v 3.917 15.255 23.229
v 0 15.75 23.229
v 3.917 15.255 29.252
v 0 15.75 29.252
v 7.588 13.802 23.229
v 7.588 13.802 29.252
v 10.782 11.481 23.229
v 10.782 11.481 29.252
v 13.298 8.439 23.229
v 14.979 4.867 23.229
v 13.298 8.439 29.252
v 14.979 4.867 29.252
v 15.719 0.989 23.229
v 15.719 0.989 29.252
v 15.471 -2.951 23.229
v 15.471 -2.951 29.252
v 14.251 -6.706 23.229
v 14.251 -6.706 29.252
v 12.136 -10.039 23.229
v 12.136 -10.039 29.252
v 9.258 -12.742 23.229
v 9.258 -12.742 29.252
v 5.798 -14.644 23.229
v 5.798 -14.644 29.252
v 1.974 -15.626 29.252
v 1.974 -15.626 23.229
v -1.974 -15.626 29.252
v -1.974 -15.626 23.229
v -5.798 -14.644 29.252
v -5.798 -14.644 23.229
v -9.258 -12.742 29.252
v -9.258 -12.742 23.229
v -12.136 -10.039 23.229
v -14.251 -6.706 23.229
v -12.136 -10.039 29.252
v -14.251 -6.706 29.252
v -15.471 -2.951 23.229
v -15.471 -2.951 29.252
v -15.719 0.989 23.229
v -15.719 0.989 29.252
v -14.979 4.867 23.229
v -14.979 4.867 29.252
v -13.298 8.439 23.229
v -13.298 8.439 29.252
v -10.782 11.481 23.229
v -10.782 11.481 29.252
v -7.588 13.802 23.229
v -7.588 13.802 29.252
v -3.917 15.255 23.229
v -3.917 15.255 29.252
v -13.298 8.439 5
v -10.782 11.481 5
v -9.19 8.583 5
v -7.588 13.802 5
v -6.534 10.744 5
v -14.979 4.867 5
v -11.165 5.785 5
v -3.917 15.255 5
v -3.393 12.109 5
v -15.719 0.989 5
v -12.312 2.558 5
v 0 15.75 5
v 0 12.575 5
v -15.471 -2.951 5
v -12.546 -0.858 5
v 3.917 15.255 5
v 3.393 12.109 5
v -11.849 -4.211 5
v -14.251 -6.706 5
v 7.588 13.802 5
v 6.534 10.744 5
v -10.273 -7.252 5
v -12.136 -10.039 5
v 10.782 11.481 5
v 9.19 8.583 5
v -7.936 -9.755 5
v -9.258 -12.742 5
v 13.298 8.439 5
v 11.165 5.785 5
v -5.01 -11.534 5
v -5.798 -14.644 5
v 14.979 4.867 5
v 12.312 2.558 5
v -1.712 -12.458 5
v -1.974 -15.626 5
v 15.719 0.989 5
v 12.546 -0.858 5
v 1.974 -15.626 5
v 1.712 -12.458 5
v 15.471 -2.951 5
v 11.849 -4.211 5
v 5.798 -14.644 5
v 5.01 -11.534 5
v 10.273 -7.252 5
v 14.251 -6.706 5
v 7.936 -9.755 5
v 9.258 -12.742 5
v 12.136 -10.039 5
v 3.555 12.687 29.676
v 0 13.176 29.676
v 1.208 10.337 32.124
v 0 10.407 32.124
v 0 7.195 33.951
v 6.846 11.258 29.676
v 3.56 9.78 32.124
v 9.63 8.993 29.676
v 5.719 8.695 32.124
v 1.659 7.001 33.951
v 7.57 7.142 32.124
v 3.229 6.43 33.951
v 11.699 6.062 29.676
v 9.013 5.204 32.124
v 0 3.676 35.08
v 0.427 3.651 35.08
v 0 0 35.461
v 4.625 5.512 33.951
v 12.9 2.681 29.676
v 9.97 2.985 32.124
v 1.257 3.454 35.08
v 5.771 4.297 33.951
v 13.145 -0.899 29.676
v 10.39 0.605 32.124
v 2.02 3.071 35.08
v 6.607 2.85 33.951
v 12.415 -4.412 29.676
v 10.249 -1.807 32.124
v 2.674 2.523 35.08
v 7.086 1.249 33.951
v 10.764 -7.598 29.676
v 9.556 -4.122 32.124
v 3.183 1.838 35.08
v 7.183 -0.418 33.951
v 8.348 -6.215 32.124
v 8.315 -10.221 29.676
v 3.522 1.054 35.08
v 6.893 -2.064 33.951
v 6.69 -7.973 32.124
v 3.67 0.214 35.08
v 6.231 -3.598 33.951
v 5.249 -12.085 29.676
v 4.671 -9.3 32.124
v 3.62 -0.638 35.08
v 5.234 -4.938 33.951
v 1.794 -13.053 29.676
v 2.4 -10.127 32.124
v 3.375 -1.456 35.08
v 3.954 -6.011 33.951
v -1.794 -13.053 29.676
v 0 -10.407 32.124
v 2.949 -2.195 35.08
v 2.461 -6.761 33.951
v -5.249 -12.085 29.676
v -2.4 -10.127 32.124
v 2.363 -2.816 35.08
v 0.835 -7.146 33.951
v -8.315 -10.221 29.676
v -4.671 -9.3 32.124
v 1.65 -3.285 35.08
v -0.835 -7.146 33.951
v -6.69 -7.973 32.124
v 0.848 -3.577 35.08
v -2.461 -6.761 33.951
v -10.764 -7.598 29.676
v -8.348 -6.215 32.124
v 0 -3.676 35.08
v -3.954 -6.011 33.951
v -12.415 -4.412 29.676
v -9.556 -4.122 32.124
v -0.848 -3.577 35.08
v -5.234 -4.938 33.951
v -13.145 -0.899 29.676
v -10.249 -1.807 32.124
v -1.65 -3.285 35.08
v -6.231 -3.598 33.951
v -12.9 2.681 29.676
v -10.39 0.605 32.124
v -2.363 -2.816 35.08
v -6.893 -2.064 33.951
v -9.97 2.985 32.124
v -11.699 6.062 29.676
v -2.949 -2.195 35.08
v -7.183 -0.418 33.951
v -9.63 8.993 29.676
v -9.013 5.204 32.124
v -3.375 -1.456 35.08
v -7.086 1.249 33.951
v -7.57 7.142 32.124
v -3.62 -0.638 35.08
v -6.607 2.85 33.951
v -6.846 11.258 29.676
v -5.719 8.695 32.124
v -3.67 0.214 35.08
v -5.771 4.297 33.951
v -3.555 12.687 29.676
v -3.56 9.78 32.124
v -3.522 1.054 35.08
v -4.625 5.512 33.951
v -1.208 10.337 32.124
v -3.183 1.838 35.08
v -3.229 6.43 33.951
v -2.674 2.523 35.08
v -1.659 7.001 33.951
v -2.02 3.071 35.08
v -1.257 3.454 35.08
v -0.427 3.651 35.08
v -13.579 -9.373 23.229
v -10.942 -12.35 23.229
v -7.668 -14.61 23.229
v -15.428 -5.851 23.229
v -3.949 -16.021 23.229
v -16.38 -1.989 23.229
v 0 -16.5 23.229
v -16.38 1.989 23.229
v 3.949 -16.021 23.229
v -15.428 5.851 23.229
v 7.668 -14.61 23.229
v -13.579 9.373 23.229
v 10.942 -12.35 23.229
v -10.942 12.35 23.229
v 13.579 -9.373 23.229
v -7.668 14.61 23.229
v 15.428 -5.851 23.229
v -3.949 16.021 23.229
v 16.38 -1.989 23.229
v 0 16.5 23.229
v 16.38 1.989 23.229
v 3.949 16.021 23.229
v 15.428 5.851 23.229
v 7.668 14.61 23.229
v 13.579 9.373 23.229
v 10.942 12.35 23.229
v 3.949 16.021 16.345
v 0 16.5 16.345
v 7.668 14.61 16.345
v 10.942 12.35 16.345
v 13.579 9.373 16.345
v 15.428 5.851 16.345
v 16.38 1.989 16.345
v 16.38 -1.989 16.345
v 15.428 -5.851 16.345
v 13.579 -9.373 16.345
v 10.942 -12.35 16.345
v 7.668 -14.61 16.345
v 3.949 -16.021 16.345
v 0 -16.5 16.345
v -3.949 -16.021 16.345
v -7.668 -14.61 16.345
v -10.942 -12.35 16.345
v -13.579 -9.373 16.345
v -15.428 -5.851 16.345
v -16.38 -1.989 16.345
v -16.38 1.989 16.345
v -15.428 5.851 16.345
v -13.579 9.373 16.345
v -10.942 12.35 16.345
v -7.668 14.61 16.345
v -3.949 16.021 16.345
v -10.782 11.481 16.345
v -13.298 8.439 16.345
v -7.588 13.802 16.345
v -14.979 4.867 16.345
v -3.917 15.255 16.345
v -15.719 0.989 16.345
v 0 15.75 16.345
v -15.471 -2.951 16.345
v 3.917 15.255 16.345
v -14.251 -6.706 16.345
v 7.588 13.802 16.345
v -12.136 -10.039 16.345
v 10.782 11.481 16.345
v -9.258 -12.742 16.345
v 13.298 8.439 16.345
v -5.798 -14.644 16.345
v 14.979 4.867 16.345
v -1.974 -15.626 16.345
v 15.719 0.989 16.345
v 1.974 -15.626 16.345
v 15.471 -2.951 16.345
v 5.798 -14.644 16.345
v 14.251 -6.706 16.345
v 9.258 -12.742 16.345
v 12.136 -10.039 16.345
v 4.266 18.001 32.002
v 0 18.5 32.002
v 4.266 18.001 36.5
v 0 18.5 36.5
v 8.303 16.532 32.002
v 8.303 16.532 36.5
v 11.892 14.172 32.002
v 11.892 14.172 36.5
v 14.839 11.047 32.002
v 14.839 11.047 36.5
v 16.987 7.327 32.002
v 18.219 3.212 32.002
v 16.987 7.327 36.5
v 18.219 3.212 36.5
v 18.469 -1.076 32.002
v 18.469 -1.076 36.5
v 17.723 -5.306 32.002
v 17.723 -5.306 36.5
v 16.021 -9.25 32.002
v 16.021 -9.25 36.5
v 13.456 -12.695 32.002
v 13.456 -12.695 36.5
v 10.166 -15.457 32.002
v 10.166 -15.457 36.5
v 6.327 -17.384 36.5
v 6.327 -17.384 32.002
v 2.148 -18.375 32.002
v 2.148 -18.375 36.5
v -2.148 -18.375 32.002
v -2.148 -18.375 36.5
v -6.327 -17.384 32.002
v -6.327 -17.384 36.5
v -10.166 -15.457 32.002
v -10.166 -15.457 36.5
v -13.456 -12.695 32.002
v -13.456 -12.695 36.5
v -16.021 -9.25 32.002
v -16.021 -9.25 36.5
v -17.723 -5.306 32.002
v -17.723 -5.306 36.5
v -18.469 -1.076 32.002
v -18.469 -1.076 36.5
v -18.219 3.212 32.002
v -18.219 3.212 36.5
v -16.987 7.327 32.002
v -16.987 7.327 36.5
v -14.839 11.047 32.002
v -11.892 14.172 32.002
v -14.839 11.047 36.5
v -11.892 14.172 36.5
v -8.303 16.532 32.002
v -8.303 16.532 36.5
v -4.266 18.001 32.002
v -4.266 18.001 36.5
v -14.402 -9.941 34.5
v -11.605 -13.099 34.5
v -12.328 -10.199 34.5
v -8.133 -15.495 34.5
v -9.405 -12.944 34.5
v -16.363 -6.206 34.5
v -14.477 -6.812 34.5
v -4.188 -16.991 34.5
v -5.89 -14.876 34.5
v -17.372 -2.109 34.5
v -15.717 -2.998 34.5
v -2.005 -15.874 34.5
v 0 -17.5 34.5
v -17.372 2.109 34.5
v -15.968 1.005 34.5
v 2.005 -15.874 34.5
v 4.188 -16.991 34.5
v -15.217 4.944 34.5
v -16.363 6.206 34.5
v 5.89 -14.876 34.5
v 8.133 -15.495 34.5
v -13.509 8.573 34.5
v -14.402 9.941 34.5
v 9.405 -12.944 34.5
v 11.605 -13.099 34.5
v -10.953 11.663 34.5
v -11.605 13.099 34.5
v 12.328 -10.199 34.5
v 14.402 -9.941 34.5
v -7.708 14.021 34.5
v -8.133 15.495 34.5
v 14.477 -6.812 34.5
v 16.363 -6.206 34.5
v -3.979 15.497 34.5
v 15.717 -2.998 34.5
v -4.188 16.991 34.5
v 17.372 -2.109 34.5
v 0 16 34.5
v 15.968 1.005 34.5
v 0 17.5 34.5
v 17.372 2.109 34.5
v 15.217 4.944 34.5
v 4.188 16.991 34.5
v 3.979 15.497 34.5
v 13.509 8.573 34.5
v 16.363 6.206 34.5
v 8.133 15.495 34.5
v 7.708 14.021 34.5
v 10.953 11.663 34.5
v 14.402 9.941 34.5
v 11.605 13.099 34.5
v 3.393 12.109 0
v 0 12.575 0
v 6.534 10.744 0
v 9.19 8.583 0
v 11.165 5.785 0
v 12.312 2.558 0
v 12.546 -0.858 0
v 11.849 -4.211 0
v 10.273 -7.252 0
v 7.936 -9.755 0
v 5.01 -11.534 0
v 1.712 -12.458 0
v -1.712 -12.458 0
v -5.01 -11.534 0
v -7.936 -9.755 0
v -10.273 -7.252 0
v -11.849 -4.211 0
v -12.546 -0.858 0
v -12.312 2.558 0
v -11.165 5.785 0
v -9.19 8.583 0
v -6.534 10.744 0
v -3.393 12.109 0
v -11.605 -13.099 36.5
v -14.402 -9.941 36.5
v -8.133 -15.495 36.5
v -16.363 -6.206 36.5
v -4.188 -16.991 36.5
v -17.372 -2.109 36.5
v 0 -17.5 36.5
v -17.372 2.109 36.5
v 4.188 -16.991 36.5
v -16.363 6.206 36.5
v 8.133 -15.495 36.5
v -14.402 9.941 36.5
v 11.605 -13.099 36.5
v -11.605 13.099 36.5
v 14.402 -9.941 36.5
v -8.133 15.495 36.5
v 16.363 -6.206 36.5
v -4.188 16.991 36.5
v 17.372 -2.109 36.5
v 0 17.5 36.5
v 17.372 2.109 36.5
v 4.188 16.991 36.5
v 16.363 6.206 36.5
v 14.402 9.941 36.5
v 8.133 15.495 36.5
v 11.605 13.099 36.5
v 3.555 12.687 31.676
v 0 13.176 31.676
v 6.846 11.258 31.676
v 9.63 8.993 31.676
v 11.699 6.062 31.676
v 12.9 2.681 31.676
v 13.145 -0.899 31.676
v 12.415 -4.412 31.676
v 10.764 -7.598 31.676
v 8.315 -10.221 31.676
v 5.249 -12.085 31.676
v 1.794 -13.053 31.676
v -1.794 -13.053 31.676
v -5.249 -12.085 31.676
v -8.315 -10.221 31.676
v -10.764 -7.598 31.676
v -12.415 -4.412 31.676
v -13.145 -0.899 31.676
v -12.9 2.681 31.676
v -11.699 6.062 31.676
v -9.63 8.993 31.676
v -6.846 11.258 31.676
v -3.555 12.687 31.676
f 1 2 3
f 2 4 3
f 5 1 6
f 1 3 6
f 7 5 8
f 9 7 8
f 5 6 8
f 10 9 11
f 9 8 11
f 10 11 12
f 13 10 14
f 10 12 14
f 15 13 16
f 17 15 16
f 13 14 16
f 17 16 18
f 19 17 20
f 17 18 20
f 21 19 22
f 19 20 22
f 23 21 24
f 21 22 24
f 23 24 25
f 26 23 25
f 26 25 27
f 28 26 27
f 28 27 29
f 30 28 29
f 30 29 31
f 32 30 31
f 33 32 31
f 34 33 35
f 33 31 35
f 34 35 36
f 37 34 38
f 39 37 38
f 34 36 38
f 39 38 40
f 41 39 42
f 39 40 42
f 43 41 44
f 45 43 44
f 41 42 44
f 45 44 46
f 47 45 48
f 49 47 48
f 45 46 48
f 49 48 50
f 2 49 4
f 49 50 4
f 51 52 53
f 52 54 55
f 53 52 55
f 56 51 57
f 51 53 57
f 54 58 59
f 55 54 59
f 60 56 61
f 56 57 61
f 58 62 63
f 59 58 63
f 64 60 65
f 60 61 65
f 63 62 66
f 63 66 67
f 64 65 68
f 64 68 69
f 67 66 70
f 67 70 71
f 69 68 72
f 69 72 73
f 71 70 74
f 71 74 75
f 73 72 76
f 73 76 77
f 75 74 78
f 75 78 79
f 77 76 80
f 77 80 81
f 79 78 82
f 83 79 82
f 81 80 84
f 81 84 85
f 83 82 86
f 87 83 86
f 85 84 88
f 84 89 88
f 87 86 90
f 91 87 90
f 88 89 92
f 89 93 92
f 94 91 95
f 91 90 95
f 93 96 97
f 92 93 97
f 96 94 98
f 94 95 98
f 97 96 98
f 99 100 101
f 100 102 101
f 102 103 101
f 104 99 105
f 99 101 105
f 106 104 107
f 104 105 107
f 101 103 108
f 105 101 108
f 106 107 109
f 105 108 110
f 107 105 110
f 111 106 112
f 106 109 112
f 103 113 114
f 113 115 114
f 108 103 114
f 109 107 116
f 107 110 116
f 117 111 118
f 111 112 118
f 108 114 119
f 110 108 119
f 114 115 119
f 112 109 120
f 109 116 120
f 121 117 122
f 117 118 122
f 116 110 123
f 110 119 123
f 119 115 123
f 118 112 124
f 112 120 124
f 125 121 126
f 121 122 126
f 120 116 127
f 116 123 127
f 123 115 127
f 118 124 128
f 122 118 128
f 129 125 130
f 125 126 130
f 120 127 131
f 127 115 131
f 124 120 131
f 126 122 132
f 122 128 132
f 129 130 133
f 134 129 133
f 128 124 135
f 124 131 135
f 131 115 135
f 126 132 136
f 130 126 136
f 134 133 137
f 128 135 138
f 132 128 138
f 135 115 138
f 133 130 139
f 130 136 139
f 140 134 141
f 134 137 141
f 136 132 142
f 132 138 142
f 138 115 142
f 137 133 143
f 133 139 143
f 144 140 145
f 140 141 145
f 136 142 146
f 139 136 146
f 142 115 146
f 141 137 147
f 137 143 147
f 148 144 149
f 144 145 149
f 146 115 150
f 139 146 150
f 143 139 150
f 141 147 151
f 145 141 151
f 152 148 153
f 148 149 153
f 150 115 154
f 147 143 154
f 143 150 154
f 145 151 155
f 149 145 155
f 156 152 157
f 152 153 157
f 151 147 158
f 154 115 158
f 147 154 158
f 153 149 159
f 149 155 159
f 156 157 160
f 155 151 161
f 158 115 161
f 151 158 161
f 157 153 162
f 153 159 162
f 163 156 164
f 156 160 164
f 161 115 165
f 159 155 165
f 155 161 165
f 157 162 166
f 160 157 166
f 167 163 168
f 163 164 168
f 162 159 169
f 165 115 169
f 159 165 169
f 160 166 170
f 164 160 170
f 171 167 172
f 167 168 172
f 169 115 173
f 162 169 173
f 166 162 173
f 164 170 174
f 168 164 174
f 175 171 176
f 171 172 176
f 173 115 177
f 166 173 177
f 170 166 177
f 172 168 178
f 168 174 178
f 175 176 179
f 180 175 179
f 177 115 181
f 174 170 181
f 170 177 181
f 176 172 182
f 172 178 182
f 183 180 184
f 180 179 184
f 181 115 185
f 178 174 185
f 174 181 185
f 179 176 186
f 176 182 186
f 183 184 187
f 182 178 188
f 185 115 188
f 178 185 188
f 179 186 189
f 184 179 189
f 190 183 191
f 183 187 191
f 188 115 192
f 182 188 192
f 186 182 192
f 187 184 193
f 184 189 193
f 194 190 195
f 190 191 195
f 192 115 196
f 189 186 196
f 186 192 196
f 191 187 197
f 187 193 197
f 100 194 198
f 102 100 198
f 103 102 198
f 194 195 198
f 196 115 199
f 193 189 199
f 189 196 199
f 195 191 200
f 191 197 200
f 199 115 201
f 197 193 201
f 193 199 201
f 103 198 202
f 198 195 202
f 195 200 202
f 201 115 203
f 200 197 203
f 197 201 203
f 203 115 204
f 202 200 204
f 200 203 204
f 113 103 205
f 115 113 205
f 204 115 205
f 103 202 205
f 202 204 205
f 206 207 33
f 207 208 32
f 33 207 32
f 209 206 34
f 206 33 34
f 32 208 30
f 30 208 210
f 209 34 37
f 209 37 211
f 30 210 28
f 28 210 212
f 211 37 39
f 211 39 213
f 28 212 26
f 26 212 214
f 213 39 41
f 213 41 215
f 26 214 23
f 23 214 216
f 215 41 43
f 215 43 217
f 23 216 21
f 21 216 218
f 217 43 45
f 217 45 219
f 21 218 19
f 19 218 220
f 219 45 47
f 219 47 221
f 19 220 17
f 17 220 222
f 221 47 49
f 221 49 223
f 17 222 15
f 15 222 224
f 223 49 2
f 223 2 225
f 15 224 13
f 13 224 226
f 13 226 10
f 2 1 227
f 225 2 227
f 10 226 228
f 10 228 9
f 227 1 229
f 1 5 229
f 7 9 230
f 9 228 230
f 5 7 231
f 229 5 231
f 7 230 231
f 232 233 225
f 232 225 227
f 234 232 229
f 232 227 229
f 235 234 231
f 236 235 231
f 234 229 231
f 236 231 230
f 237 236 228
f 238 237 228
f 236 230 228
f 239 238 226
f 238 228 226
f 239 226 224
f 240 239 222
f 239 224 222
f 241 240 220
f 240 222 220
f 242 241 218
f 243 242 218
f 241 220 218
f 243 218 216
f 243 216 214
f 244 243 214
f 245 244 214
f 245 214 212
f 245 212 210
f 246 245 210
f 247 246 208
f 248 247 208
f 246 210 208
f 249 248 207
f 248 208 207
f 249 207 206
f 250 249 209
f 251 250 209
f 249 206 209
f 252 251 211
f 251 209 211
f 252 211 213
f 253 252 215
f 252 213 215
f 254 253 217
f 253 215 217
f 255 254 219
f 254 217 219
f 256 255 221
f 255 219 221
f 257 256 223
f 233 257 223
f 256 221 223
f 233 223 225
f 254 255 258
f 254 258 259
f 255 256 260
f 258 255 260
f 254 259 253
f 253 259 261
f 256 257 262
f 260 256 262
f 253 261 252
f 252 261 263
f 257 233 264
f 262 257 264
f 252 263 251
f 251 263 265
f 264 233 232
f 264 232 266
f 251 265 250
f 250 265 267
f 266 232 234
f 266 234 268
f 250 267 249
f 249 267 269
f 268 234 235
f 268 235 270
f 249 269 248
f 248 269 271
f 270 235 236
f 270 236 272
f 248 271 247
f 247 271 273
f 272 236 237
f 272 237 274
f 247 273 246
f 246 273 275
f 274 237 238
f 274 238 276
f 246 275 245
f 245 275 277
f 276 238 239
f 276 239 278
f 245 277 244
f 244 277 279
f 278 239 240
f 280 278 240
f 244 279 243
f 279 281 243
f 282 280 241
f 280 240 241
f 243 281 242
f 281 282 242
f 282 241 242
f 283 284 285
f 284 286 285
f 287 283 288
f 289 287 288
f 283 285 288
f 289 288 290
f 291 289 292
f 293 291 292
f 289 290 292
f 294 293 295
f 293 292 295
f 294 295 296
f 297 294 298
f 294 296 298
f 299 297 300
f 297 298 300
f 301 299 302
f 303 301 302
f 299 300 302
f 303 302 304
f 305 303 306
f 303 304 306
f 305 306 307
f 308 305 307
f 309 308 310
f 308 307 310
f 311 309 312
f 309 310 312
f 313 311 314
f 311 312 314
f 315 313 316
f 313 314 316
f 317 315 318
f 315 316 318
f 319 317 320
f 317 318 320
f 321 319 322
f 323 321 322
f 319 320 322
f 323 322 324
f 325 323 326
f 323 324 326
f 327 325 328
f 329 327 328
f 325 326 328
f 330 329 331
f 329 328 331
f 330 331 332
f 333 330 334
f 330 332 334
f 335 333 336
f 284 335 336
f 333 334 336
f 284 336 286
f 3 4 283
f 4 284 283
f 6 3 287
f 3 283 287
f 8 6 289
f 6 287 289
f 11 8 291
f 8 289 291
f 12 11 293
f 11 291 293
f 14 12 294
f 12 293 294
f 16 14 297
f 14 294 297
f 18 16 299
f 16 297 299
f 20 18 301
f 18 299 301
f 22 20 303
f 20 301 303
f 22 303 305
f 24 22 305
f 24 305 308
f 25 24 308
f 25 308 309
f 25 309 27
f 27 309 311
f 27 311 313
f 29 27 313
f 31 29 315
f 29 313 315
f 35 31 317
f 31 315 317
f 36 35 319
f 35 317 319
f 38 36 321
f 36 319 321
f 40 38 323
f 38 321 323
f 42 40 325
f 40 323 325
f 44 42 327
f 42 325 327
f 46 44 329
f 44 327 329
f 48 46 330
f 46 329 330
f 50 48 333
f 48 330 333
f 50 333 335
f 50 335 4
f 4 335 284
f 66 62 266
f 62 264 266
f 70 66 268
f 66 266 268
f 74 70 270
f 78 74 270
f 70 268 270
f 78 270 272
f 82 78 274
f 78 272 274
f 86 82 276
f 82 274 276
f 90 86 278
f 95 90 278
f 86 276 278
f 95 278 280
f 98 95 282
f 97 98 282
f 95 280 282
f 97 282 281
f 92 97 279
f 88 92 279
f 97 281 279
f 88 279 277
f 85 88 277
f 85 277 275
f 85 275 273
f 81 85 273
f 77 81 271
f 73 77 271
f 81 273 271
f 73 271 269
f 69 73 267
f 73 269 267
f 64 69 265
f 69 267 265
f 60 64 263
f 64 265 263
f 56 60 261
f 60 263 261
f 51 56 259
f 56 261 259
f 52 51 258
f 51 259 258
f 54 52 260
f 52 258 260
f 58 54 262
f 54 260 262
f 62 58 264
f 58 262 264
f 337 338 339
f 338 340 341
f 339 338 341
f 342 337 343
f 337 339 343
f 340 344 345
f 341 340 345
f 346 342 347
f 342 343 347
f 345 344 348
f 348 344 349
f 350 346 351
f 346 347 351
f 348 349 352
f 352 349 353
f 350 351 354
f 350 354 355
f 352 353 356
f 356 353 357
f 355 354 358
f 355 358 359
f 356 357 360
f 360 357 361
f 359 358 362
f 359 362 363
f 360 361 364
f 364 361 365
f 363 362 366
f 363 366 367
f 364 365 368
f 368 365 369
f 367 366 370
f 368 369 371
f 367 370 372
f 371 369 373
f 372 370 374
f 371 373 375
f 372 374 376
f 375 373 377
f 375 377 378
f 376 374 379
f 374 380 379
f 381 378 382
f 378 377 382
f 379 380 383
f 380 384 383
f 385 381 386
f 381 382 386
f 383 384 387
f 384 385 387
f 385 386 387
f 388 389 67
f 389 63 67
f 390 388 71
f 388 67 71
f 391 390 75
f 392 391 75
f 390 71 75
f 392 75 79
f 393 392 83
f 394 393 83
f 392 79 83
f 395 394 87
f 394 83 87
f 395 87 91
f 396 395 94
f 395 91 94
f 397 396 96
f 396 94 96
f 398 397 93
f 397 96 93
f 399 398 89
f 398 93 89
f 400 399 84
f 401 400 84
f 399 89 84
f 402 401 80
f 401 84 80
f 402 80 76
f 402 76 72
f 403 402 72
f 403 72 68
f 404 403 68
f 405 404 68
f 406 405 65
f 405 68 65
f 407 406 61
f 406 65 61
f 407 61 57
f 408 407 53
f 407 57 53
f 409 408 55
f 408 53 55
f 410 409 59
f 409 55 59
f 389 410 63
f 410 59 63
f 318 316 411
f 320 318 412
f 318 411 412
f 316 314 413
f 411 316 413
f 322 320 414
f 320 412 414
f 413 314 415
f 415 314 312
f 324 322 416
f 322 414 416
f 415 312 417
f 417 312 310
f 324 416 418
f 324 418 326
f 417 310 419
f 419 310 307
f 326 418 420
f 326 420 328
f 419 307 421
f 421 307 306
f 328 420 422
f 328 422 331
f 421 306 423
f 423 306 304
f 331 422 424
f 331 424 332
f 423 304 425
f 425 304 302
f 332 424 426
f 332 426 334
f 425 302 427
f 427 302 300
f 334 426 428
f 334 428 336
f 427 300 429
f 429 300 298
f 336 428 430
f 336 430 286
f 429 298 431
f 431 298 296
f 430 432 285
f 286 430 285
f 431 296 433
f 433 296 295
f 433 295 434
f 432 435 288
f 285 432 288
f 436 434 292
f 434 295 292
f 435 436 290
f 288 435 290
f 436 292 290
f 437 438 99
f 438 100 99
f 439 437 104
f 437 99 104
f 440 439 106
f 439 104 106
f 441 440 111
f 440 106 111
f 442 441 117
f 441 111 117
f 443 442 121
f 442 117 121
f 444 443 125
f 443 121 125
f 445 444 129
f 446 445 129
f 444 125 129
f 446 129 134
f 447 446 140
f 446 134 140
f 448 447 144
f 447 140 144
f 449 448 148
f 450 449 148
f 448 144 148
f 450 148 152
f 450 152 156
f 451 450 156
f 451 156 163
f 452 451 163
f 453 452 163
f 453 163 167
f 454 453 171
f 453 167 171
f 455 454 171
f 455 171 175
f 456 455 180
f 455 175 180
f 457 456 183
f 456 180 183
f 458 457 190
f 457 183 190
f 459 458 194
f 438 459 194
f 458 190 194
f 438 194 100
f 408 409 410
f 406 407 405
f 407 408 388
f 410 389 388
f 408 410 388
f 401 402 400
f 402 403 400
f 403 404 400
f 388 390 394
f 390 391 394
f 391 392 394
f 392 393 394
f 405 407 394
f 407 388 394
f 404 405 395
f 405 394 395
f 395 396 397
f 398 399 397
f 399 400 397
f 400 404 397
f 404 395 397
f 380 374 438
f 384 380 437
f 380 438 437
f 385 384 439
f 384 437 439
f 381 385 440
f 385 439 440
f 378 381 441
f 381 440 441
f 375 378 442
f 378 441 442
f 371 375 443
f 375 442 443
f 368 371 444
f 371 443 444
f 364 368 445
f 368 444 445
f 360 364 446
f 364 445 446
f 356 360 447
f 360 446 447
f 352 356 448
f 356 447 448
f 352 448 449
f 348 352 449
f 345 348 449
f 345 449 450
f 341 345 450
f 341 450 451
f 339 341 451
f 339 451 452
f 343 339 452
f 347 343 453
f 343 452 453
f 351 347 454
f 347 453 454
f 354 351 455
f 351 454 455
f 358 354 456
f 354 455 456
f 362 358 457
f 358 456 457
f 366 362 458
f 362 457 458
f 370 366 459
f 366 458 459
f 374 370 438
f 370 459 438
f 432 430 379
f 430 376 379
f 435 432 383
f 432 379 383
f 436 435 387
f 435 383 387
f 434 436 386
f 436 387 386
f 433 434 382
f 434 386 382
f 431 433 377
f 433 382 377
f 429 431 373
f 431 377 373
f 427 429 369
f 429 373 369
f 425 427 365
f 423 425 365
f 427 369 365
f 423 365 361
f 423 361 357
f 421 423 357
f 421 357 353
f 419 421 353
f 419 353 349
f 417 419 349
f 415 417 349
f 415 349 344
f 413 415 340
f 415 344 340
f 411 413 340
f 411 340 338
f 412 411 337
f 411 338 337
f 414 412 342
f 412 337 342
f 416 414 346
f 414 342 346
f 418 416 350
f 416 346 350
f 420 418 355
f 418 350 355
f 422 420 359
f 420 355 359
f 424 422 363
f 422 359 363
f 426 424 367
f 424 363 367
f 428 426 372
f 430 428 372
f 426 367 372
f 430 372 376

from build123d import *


with BuildPart() as part:
    # Sketch1 → Revolve1 (revolve)
    with BuildSketch(Plane(origin=(0, 0, 0), x_dir=(0, 0, -1), z_dir=(1, 0, 0))):
        with BuildLine():
            Line((0, 0), (0, 12.575))
            Line((0, 12.575), (-5, 12.575))
            Line((-5, 12.575), (-5, 15.75))
            Line((-5, 15.75), (-16.345423433, 15.75))
            Line((-16.345423433, 15.75), (-16.345423433, 16.5))
            Line((-16.345423433, 16.5), (-23.228752503, 16.5))
            Line((-23.228752503, 16.5), (-23.228752503, 15.75))
            Line((-23.228752503, 15.75), (-29.251665438, 15.75))
            Line((-29.251665438, 15.75), (-32.001665438, 18.5))
            Line((-32.001665438, 18.5), (-36.5, 18.5))
            Line((-36.5, 18.5), (-36.5, 17.5))
            Line((-36.5, 17.5), (-34.5, 17.5))
            Line((-34.5, 17.5), (-34.5, 16))
            Line((-34.5, 16), (-31.676037941, 13.176037941))
            Line((-31.676037941, 13.176037941), (-29.676037941, 13.176037941))
            ThreePointArc((-29.676037941, 13.176037941), (-33.951349088, 7.19510787), (-35.461393008, 0))
            Line((-35.461393008, 0), (0, 0))
        make_face()
    revolve(axis=Axis((0, 0, 35.461393008), (0, 0, -1)))


solid = part.part
